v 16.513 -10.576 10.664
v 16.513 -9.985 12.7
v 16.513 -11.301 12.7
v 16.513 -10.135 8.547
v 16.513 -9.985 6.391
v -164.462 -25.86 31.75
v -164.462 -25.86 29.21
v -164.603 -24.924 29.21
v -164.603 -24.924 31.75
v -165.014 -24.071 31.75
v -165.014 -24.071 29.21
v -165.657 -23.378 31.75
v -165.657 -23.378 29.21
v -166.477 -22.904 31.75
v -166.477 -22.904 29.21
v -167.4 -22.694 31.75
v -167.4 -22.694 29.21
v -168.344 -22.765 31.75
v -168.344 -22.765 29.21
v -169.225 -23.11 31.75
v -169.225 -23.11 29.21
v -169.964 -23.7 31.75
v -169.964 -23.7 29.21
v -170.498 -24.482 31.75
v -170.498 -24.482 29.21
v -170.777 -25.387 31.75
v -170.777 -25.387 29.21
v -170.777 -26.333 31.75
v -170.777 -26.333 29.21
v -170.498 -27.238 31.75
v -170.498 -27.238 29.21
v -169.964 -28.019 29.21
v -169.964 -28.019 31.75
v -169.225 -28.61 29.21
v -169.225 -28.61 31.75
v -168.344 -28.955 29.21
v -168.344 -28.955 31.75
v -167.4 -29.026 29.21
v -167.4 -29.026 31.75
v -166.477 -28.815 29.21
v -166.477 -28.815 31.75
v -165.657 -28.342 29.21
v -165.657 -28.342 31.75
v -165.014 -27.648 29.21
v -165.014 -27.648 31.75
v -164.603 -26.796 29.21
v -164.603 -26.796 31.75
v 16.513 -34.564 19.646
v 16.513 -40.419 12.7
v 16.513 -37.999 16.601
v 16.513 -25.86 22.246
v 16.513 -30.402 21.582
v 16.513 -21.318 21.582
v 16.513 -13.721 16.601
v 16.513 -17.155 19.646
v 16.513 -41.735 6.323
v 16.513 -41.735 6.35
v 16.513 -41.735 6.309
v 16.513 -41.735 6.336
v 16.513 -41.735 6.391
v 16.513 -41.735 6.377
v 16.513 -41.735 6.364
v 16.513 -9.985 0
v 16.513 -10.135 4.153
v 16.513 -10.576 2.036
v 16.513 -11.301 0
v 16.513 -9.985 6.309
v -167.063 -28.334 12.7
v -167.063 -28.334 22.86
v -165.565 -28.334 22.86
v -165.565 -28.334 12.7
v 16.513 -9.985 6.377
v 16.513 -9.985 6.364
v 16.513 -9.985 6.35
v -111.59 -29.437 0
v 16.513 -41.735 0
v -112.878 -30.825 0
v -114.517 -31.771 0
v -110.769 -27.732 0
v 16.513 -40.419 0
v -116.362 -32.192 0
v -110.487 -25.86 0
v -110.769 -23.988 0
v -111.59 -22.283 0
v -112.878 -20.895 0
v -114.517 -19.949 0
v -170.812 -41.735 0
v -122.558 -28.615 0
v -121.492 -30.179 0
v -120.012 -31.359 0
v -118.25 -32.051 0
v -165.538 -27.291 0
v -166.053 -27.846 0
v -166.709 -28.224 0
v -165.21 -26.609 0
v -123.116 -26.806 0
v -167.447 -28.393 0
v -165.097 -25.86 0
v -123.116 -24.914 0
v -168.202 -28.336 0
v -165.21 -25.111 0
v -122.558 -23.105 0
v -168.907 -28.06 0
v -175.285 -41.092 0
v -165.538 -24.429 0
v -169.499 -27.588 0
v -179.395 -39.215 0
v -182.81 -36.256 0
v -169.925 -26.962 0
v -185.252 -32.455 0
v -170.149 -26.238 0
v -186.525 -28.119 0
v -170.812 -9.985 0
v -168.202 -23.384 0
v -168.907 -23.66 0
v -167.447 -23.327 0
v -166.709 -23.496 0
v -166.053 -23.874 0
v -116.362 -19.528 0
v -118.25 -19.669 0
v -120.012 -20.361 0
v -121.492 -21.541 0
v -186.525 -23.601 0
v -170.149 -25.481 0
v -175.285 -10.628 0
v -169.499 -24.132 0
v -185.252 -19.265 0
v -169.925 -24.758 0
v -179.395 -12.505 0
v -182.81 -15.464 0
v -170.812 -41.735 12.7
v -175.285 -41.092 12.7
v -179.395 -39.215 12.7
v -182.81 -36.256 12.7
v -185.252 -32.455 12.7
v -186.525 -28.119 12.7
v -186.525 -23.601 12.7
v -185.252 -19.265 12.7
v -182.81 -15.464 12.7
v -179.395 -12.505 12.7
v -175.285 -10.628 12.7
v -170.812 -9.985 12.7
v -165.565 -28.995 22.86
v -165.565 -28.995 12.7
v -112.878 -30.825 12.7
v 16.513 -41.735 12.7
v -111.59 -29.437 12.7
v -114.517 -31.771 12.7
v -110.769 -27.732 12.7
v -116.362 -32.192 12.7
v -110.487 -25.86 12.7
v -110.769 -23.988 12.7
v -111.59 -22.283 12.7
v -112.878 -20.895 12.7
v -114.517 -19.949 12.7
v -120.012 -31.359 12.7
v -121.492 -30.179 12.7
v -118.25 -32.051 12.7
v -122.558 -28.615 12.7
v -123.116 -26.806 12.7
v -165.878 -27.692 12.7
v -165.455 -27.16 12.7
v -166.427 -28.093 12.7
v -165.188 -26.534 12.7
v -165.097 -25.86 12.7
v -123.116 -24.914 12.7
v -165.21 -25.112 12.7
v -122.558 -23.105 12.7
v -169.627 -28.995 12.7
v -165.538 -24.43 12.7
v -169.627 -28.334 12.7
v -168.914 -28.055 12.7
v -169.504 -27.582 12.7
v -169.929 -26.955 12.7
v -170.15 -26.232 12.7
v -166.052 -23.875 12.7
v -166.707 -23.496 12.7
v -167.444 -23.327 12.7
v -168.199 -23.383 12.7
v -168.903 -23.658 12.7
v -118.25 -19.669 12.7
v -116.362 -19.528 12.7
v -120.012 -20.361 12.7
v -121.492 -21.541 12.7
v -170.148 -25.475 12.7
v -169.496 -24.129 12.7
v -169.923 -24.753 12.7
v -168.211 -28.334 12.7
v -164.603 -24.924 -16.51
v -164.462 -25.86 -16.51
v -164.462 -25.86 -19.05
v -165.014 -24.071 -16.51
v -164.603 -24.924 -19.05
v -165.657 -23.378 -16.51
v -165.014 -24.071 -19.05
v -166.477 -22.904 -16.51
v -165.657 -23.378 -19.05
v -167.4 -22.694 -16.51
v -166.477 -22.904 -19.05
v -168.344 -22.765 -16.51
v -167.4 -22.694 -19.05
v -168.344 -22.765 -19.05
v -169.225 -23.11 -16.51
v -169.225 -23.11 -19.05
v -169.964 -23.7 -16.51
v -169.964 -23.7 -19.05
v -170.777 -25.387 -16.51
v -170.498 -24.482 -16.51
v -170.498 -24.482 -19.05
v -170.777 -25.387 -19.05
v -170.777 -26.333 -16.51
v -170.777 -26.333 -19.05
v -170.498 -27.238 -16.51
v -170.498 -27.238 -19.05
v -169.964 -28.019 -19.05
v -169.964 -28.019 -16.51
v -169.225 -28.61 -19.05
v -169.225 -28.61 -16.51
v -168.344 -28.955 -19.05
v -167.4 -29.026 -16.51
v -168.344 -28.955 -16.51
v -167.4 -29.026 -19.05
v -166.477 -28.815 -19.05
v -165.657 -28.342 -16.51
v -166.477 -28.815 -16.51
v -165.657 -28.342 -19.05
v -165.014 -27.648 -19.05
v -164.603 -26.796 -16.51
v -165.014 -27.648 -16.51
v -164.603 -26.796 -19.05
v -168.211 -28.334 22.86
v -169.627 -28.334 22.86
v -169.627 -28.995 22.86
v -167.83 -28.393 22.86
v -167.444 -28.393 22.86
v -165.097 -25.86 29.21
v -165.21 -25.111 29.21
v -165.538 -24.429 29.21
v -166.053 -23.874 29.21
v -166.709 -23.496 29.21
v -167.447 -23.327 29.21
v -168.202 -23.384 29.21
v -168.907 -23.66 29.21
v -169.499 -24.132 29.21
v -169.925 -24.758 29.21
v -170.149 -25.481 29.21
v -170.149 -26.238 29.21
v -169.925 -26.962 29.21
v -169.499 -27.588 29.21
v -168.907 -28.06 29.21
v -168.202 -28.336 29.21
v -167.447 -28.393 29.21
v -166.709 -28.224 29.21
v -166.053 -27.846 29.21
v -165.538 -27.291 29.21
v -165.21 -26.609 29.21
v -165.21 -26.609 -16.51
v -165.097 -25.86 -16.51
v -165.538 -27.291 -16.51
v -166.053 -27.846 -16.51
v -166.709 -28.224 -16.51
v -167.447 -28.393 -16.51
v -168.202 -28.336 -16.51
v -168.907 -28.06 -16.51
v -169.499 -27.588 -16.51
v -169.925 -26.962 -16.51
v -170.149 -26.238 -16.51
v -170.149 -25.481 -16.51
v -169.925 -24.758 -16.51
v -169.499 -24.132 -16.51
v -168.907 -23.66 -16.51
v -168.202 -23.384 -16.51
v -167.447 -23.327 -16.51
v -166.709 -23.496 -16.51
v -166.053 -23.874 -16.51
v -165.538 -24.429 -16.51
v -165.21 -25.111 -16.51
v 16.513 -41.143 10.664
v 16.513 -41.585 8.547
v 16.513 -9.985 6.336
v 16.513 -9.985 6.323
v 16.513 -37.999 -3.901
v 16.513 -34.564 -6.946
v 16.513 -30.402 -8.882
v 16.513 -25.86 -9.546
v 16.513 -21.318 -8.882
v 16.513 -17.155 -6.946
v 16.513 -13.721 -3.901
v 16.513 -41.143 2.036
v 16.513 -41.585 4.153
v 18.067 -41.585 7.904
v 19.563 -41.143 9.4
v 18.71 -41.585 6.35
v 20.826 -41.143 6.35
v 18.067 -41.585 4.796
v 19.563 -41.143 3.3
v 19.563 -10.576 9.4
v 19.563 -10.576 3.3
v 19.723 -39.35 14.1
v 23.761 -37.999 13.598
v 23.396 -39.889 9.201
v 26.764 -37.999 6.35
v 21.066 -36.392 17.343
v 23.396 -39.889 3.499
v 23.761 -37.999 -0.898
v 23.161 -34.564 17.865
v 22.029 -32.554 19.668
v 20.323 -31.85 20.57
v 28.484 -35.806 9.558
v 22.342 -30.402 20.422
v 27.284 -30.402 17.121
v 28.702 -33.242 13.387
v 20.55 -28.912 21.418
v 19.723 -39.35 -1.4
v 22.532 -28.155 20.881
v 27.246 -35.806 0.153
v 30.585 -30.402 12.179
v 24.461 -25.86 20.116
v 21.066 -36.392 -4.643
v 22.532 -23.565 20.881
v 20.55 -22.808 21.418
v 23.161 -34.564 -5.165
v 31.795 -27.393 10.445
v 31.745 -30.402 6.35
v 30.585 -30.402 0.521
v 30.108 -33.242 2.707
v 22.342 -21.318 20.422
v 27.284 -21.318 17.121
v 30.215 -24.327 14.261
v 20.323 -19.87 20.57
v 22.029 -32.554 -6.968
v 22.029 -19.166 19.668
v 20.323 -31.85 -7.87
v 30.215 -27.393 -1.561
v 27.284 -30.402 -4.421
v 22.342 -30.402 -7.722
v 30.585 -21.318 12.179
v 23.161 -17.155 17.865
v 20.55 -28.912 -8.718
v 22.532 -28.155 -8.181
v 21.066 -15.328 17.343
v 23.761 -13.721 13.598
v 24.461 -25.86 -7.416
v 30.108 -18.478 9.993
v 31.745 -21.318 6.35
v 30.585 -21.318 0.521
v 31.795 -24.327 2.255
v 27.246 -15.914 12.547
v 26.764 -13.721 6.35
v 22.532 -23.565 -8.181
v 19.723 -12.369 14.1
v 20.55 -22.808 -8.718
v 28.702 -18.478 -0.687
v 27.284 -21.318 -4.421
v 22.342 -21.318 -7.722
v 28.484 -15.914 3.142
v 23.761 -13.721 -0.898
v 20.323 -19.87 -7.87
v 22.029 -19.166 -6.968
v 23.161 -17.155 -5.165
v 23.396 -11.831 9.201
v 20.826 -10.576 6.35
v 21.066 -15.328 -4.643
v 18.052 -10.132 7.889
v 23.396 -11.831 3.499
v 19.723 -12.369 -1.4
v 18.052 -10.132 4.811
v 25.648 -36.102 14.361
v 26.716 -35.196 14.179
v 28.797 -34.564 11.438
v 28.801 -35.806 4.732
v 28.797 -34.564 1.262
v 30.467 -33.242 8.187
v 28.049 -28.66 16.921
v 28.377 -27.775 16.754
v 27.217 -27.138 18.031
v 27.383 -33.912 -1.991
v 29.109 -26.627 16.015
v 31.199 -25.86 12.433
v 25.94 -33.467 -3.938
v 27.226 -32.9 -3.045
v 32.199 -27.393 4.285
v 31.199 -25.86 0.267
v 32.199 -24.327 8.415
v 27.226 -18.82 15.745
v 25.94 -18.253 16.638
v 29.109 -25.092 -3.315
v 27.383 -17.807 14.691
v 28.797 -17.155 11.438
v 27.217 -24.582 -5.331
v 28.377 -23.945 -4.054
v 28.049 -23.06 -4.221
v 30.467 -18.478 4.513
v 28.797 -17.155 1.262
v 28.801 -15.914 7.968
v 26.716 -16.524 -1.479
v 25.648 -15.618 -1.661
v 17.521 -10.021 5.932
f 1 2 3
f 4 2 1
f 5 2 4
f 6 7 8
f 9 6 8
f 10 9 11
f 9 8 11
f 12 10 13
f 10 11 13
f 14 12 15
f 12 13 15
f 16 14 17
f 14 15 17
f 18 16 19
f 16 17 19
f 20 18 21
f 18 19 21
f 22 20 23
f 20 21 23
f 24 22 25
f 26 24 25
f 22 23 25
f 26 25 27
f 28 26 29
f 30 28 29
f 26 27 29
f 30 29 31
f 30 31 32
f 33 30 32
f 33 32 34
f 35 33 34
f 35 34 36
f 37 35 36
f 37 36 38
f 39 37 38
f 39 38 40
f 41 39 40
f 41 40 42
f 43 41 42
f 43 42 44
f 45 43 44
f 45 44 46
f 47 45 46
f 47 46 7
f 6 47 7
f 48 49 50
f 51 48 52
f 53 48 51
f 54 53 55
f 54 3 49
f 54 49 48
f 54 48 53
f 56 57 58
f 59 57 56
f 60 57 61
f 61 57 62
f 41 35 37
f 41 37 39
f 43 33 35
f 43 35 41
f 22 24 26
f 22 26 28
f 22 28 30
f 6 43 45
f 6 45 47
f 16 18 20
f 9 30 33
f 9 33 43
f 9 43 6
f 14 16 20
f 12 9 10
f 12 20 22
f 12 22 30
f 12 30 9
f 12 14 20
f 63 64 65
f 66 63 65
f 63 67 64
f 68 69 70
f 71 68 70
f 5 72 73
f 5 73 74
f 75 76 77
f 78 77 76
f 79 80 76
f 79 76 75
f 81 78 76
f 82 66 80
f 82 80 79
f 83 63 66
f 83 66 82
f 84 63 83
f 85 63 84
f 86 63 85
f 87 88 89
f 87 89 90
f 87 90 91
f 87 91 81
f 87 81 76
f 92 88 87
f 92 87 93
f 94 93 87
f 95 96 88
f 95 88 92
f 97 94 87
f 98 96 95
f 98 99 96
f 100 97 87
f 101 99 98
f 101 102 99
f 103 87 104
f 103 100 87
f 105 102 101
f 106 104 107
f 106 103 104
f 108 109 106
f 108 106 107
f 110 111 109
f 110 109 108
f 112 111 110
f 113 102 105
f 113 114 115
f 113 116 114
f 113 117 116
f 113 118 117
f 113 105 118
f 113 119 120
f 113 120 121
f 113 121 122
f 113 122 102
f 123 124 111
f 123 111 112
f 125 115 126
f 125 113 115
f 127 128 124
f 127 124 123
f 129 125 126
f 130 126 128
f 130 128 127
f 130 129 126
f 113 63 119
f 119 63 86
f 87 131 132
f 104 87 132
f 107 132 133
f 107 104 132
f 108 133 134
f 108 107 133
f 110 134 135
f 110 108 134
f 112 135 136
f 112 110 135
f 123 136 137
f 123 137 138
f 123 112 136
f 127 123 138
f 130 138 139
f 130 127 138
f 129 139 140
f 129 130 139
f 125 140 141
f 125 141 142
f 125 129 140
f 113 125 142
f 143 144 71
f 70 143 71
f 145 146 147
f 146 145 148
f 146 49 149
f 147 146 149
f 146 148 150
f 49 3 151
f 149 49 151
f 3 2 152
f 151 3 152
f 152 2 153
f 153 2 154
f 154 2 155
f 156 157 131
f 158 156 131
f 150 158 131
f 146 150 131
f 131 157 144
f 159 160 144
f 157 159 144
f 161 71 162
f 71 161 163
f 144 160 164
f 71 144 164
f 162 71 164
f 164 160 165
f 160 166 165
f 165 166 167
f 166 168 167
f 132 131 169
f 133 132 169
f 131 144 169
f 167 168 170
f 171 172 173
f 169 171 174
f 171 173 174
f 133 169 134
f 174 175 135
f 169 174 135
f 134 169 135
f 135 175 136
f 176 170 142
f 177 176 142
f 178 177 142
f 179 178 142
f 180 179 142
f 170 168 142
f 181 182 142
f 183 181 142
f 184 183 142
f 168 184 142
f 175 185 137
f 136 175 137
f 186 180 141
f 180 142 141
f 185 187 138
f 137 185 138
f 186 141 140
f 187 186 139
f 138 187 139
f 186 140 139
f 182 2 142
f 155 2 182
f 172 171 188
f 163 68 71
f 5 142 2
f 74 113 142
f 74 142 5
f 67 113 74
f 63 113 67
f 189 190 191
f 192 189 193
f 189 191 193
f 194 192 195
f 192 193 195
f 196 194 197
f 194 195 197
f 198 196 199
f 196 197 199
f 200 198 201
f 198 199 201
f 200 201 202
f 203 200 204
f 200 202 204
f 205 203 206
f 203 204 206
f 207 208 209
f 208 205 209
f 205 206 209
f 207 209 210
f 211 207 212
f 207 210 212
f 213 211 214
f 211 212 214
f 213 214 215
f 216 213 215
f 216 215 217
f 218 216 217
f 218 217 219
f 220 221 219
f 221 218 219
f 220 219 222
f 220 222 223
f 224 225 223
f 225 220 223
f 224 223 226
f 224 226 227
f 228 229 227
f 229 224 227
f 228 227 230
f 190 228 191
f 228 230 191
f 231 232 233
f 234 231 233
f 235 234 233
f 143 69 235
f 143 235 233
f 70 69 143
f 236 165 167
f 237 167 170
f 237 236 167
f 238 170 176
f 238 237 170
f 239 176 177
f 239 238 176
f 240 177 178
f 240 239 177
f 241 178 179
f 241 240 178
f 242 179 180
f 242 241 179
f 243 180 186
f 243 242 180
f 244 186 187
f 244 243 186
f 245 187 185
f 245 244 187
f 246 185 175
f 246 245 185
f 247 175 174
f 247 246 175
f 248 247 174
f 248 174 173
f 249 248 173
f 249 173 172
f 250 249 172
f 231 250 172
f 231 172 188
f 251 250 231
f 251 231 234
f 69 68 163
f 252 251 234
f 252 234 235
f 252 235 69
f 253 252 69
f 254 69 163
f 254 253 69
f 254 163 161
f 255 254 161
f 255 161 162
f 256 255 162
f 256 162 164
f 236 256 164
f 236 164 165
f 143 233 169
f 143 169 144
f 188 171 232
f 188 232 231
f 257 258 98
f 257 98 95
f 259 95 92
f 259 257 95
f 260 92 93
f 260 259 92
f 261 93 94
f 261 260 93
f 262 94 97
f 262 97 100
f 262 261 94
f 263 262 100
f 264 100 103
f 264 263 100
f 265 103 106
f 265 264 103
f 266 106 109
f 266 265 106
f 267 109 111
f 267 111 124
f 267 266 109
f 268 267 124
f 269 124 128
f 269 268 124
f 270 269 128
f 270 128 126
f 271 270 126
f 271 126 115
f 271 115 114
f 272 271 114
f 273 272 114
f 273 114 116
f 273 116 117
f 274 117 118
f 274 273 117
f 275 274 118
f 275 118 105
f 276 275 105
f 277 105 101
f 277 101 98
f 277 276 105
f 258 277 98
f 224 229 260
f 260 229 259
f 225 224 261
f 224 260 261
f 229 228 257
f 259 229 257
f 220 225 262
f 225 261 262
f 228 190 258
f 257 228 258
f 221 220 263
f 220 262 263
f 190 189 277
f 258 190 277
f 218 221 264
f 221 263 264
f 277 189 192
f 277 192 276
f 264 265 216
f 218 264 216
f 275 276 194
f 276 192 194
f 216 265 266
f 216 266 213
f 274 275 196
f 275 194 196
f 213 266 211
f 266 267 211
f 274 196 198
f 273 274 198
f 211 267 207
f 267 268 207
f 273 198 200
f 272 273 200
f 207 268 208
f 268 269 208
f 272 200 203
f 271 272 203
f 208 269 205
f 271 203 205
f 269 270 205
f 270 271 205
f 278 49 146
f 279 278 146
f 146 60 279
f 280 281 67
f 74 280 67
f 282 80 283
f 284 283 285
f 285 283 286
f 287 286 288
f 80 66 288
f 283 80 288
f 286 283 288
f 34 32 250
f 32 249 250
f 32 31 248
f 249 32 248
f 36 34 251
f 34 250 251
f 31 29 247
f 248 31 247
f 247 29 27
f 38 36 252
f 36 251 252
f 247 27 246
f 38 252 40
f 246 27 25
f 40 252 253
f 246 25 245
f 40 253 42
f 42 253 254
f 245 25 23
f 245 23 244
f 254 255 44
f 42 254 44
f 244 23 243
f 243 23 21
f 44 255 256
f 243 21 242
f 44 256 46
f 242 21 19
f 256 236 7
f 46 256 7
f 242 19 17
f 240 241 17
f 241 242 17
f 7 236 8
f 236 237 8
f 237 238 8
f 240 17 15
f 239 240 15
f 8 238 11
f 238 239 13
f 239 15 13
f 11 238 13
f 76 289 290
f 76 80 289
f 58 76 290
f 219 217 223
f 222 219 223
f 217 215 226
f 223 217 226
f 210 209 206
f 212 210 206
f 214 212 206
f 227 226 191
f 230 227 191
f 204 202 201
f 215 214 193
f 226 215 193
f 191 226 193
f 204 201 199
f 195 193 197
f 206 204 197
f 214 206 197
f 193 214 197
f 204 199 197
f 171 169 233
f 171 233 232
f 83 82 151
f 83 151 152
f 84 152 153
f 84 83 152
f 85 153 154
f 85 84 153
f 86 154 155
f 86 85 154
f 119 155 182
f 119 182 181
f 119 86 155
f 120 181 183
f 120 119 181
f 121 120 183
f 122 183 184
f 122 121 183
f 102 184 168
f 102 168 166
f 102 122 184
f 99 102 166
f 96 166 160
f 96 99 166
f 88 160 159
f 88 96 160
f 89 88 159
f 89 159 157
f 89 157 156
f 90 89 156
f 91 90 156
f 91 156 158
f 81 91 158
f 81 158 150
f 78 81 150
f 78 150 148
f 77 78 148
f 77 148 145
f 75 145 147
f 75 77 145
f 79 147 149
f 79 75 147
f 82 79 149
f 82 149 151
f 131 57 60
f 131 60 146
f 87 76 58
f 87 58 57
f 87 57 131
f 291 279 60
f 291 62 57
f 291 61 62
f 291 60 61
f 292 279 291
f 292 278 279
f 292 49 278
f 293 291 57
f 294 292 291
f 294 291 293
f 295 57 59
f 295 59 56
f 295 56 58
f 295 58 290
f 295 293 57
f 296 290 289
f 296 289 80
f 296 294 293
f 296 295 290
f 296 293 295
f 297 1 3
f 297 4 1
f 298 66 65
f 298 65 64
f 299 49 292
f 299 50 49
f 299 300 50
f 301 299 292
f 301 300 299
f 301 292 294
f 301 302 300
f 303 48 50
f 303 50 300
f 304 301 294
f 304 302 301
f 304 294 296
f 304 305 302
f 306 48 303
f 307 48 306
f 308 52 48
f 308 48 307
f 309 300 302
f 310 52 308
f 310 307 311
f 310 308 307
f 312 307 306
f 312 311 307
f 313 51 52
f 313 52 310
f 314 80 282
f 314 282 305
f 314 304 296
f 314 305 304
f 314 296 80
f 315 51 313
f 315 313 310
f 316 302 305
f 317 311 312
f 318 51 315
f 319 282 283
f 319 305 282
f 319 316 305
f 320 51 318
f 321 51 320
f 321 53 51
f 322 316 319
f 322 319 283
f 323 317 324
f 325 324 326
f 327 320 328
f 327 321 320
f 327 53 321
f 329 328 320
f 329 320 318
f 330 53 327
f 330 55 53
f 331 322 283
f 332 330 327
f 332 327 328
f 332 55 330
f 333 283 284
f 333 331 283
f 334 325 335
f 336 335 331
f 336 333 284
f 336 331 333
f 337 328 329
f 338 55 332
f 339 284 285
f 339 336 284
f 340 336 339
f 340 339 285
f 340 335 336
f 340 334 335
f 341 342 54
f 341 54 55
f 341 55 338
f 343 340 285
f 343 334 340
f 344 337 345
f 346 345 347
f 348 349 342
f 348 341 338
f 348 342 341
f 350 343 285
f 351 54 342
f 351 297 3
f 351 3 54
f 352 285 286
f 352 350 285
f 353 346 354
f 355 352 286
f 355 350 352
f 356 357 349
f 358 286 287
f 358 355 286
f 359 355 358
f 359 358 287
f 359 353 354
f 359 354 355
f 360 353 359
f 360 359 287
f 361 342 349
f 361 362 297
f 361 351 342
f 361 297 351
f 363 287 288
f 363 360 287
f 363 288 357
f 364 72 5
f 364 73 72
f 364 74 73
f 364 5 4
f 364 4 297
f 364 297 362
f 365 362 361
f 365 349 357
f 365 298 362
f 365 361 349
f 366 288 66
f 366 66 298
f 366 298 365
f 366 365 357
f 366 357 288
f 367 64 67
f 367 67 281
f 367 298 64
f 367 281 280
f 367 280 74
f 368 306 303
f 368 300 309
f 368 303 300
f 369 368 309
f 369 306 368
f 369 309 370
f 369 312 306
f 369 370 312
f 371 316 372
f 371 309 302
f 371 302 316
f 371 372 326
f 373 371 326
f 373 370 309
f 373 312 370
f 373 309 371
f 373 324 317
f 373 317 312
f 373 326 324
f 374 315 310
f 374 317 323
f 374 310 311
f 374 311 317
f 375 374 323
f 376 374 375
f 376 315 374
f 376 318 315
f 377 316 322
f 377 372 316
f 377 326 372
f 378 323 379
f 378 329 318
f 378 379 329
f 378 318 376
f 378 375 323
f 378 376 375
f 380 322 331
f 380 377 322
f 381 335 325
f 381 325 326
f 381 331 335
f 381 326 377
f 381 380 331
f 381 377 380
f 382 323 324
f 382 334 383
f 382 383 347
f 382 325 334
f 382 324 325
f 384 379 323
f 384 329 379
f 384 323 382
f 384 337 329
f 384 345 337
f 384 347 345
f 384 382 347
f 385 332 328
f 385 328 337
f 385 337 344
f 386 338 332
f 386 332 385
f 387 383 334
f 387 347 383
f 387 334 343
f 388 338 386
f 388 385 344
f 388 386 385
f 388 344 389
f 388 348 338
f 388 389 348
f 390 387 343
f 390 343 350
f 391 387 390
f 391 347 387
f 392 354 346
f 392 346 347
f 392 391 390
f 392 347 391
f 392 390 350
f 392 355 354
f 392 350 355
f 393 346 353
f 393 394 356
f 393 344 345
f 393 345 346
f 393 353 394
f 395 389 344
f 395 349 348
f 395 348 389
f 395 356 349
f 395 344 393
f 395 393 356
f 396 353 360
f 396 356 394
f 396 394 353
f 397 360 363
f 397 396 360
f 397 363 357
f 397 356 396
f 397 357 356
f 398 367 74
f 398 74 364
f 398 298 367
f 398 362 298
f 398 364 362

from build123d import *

# Parameters (mm, degrees)
SKETCH1_R                = 6.35
BOSS_EXTRUDE1_DEPTH      = 12.7
BOSS_EXTRUDE2_DEPTH      = 19.05
BOSS_EXTRUDE2_DEPTH_BACK = 31.75
SKETCH2_R                = 3.175
CUT_EXTRUDE1_START       = -2.54
SKETCH3_OUTSIDE_W        = 247.57
SKETCH3_OUTSIDE_H        = 76.12
SKETCH3_OUTSIDE_R        = 2.54
CUT_EXTRUDE1_DEPTH       = 16.51
CUT_EXTRUDE2_START       = -2.54
SKETCH4_OUTSIDE_W        = 247.57
SKETCH4_OUTSIDE_H        = 76.12
SKETCH4_OUTSIDE_R        = 2.54
CUT_EXTRUDE2_DEPTH       = 16.51
REVOLVE1_ANGLE           = 180
SKETCH9_W                = 4.061831886
SKETCH9_H                = 0.660529679
BOSS_EXTRUDE4_DEPTH      = 10.16


with BuildPart() as part:
    # Sketch1 → Boss-Extrude1 (new body)
    with BuildSketch(Plane.XY):
        with BuildLine():
            Line((16.512967167, -9.984929936), (16.512967167, -41.734929936))
            Line((16.512967167, -41.734929936), (-170.812032833, -41.734929936))
            ThreePointArc((-170.812032833, -41.734929936), (-186.687032833, -25.859929936), (-170.812032833, -9.984929936))
            Line((-170.812032833, -9.984929936), (16.512967167, -9.984929936))
        make_face()
        with Locations((-116.837032833, -25.859929936)):
            Circle(SKETCH1_R, mode=Mode.SUBTRACT)
    extrude(amount=BOSS_EXTRUDE1_DEPTH)

    # Sketch2 → Boss-Extrude2 (add, two sides: drawn at the far end of the back side and taken through both)
    with BuildSketch(Plane.XY.offset(12.7).offset(-BOSS_EXTRUDE2_DEPTH_BACK)):
        with Locations((-167.637032833, -25.859929936)):
            Circle(SKETCH2_R)
    extrude(amount=BOSS_EXTRUDE2_DEPTH + BOSS_EXTRUDE2_DEPTH_BACK)

    # Sketch3 outside → Cut-Extrude1 (cut)
    with BuildSketch(Plane.XY.offset(31.75).offset(CUT_EXTRUDE1_START)):
        with Locations((-85.087, -25.86)):
            Rectangle(SKETCH3_OUTSIDE_W, SKETCH3_OUTSIDE_H)
        with Locations((-167.637032833, -25.859929936)):
            Circle(SKETCH3_OUTSIDE_R, mode=Mode.SUBTRACT)
    extrude(amount=-CUT_EXTRUDE1_DEPTH, mode=Mode.SUBTRACT)

    # Sketch4 outside → Cut-Extrude2 (cut)
    with BuildSketch(Plane(origin=(0, 0, -19.05), x_dir=(-1, 0, 0), z_dir=(0, 0, -1)).offset(CUT_EXTRUDE2_START)):
        with Locations((85.087, -25.86)):
            Rectangle(SKETCH4_OUTSIDE_W, SKETCH4_OUTSIDE_H)
        with Locations(Location((167.637032833, -25.859929936, 0), (0, 0, 180))):
            Circle(SKETCH4_OUTSIDE_R, mode=Mode.SUBTRACT)
    extrude(amount=-CUT_EXTRUDE2_DEPTH, mode=Mode.SUBTRACT)

    # Sketch6 → Revolve1 (revolve)
    with BuildSketch(Plane(origin=(16.512967167, 0, 0), x_dir=(0, 0, -1), z_dir=(1, 0, 0))):
        with BuildLine():
            Line((-6.35, -9.984929936), (-6.35, -41.734929936))
            ThreePointArc((-6.35, -41.734929936), (-22.245527261, -25.859929936), (-6.35, -9.984929936))
        make_face()
    revolve(axis=Axis((16.512967167, -9.984929936, 6.35), (0, 1, 0)), revolution_arc=REVOLVE1_ANGLE)

    # Sketch9 → Boss-Extrude4 (add)
    with BuildSketch(Plane.XY.offset(12.7)):
        with Locations((-167.595763161, -28.664448748)):
            Rectangle(SKETCH9_W, SKETCH9_H)
    extrude(amount=BOSS_EXTRUDE4_DEPTH)


solid = part.part
